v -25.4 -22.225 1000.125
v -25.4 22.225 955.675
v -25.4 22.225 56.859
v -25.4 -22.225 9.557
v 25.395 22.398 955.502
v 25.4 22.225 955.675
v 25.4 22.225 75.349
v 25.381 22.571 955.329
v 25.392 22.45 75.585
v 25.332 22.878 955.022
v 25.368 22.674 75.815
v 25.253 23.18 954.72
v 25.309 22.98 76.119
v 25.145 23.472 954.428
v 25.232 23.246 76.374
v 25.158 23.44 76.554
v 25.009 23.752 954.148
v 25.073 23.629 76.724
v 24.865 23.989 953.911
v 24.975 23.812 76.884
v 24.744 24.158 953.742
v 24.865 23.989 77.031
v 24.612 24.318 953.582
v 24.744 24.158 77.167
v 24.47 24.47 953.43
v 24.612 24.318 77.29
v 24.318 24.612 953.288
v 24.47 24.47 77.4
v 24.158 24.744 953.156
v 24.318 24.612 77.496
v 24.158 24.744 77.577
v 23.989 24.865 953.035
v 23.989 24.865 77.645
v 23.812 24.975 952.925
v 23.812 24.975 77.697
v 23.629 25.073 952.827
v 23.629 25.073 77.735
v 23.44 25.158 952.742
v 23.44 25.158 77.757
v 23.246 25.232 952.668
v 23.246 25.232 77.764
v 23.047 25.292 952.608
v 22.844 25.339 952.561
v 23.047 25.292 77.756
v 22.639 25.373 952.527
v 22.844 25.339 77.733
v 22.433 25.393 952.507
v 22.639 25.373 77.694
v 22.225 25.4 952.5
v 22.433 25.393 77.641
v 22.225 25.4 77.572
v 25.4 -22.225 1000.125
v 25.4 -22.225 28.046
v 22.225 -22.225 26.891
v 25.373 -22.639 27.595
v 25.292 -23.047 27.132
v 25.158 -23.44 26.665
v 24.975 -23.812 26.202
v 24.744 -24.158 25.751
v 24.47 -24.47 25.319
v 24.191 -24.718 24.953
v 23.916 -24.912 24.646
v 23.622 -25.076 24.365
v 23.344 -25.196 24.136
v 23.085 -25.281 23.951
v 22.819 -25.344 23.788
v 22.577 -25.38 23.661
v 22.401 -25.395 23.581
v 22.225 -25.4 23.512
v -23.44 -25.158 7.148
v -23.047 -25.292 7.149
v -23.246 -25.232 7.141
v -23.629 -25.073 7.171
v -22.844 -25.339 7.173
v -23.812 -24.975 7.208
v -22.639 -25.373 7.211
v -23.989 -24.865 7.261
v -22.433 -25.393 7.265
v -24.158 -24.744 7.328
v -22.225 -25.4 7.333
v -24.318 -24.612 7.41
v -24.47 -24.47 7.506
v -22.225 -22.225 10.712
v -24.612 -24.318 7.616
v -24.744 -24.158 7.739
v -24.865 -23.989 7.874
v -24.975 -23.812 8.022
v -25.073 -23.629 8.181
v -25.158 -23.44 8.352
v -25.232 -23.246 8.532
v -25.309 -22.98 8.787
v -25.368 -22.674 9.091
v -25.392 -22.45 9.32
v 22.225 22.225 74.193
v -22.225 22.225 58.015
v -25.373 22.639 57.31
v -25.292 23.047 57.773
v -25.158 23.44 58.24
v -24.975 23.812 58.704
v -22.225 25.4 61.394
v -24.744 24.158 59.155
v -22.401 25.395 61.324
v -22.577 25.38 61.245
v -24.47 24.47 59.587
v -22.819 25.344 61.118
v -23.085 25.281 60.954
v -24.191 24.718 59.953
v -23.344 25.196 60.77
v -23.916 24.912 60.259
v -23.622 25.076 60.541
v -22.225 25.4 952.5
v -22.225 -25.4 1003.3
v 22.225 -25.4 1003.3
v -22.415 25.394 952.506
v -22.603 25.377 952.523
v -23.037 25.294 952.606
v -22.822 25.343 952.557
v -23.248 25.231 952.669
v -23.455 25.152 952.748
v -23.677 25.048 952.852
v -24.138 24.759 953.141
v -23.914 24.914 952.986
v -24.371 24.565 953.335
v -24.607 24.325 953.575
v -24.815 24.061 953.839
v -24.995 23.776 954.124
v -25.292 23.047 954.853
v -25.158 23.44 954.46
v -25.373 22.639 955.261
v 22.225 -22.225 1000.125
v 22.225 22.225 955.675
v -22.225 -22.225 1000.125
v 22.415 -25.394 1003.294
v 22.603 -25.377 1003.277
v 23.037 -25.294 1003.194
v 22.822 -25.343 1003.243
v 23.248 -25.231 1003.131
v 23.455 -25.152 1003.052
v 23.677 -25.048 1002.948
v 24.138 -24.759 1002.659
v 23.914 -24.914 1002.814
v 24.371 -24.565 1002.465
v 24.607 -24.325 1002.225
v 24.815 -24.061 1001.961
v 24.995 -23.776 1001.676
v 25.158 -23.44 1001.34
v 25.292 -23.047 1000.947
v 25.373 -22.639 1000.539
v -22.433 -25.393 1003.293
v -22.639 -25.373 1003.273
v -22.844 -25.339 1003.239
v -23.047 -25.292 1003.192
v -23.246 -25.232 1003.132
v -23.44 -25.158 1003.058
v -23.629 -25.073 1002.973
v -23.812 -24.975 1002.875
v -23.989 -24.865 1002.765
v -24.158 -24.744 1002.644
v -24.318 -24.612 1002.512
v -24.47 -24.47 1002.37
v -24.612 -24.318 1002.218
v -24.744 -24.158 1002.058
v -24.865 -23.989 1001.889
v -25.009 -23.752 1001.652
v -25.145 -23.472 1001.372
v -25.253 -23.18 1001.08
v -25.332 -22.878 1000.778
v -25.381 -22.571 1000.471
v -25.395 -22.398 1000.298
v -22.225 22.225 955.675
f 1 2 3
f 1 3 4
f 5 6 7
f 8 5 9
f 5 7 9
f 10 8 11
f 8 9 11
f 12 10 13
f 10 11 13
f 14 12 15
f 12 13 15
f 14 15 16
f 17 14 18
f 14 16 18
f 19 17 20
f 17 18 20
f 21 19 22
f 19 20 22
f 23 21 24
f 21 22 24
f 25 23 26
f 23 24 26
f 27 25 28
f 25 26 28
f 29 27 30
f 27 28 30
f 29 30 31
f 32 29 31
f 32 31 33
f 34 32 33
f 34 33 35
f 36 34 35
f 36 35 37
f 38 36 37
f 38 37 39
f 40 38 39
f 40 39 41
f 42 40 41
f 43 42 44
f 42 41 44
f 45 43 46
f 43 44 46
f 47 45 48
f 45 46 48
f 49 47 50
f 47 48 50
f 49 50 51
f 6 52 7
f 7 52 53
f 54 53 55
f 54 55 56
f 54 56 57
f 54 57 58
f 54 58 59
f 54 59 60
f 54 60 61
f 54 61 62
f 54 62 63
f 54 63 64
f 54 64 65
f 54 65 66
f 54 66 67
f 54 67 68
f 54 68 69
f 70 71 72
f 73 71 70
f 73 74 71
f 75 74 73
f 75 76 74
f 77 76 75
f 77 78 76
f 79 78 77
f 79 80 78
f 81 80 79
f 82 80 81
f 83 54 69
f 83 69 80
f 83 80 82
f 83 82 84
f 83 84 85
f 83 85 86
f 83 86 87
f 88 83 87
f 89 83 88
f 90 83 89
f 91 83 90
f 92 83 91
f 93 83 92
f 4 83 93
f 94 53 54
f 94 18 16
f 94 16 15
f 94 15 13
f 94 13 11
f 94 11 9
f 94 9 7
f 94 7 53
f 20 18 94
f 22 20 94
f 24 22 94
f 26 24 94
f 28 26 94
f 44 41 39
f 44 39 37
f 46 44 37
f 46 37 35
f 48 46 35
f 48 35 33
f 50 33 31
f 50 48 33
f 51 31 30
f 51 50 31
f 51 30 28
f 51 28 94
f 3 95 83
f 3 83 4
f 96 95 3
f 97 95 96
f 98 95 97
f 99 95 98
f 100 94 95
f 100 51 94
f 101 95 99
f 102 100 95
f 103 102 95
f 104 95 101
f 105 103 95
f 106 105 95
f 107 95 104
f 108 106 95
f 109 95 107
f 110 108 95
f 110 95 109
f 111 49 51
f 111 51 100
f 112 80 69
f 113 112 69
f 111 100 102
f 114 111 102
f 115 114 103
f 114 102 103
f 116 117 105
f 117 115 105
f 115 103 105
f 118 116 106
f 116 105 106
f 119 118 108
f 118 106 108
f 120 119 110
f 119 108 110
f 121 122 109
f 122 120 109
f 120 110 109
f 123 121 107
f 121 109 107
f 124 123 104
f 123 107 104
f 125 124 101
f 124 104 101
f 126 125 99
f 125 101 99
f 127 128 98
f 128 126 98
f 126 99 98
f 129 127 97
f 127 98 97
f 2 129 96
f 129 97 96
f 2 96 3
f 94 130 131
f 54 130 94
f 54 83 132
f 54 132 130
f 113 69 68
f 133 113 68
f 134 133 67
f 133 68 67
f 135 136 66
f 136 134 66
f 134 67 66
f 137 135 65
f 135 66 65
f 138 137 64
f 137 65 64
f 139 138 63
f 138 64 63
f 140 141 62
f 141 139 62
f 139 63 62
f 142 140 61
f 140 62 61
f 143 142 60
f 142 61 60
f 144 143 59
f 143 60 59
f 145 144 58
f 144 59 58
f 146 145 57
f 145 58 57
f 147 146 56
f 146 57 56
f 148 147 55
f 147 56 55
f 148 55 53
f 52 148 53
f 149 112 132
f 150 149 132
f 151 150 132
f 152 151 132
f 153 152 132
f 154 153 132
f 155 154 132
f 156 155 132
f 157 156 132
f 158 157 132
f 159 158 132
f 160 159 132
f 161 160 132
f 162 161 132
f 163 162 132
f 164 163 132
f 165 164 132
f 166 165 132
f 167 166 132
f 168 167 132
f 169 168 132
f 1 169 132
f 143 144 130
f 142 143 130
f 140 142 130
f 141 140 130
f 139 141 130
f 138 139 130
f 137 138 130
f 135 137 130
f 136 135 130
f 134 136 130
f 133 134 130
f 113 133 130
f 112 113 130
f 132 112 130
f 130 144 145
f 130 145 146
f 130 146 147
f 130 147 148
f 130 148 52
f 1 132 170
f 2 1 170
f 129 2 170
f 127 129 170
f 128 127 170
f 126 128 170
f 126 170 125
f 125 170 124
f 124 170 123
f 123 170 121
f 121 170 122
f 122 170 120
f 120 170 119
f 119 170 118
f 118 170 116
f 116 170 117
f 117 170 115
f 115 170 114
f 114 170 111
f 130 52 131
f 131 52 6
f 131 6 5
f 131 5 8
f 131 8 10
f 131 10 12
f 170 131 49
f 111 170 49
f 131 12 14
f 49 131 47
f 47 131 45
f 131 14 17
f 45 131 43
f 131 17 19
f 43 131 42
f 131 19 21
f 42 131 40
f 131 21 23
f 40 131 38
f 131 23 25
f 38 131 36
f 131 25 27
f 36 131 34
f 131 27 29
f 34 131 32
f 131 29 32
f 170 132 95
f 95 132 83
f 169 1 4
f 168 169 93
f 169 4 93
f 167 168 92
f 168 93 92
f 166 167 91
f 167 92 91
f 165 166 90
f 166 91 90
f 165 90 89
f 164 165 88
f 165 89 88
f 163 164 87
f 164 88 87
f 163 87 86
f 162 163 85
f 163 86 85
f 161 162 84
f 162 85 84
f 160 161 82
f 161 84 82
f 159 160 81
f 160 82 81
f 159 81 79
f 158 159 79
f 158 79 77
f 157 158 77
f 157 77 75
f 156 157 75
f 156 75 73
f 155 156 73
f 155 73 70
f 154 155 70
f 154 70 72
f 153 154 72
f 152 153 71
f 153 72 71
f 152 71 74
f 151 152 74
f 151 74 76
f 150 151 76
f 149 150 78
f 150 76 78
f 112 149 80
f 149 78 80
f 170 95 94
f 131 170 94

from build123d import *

# Parameters (mm, degrees)
F0_W          = 44.45
F0_H          = 44.45
F1_DEPTH      = 1003.3
F3_DEPTH      = 50.801
F5_DEPTH      = 50.801
F7_W          = 181.430888
F7_H          = 203.2
F8_DEPTH      = 50.8
F8_DEPTH_BACK = 6.35


with BuildPart() as f1:
    # F0 (on Top) → F1 (new body)
    with BuildSketch(Plane.XY):
        with BuildLine():
            ThreePointArc((25.4, 22.225), (24.470064, 24.470064), (22.225, 25.4))
            Line((22.225, 25.4), (-22.225, 25.4))
            ThreePointArc((-22.225, 25.4), (-24.470064, 24.470064), (-25.4, 22.225))
            Line((-25.4, 22.225), (-25.4, -22.225))
            ThreePointArc((-25.4, -22.225), (-24.470064, -24.470064), (-22.225, -25.4))
            Line((-22.225, -25.4), (22.225, -25.4))
            ThreePointArc((22.225, -25.4), (24.470064, -24.470064), (25.4, -22.225))
            Line((25.4, -22.225), (25.4, 22.225))
        make_face()
        Rectangle(F0_W, F0_H, mode=Mode.SUBTRACT)
    extrude(amount=F1_DEPTH)

    # F2 (on face) → F3 (cut, through all)
    with BuildSketch(Plane.YZ.offset(25.4)):
        Polygon((25.4, 1003.3), (-25.4, 1003.3), (25.4, 952.5), align=None)
    extrude(amount=-F3_DEPTH, mode=Mode.SUBTRACT)

    # F4 (on face) → F5 (cut, through all)
    with BuildSketch(Plane.XZ.offset(25.4)):
        Polygon((-25.4, 0), (25.4, 0), (25.4, 18.489688), align=None)
    extrude(amount=-F5_DEPTH, mode=Mode.SUBTRACT)

    # F7 (on face) → F8 (cut, two sides)
    with BuildSketch(Plane(origin=(-5.286317, -15.456156, 14.524036), x_dir=(-0.970315, 0.176242, -0.165613), z_dir=(0.241845, 0.707107, -0.664463))) as f8_sk:
        with Locations((-6.846333, -13.58029)):
            Rectangle(F7_W, F7_H)
    extrude(amount=F8_DEPTH, mode=Mode.SUBTRACT)
    extrude(f8_sk.sketch, amount=-F8_DEPTH_BACK, mode=Mode.SUBTRACT)


solid = f1.part
